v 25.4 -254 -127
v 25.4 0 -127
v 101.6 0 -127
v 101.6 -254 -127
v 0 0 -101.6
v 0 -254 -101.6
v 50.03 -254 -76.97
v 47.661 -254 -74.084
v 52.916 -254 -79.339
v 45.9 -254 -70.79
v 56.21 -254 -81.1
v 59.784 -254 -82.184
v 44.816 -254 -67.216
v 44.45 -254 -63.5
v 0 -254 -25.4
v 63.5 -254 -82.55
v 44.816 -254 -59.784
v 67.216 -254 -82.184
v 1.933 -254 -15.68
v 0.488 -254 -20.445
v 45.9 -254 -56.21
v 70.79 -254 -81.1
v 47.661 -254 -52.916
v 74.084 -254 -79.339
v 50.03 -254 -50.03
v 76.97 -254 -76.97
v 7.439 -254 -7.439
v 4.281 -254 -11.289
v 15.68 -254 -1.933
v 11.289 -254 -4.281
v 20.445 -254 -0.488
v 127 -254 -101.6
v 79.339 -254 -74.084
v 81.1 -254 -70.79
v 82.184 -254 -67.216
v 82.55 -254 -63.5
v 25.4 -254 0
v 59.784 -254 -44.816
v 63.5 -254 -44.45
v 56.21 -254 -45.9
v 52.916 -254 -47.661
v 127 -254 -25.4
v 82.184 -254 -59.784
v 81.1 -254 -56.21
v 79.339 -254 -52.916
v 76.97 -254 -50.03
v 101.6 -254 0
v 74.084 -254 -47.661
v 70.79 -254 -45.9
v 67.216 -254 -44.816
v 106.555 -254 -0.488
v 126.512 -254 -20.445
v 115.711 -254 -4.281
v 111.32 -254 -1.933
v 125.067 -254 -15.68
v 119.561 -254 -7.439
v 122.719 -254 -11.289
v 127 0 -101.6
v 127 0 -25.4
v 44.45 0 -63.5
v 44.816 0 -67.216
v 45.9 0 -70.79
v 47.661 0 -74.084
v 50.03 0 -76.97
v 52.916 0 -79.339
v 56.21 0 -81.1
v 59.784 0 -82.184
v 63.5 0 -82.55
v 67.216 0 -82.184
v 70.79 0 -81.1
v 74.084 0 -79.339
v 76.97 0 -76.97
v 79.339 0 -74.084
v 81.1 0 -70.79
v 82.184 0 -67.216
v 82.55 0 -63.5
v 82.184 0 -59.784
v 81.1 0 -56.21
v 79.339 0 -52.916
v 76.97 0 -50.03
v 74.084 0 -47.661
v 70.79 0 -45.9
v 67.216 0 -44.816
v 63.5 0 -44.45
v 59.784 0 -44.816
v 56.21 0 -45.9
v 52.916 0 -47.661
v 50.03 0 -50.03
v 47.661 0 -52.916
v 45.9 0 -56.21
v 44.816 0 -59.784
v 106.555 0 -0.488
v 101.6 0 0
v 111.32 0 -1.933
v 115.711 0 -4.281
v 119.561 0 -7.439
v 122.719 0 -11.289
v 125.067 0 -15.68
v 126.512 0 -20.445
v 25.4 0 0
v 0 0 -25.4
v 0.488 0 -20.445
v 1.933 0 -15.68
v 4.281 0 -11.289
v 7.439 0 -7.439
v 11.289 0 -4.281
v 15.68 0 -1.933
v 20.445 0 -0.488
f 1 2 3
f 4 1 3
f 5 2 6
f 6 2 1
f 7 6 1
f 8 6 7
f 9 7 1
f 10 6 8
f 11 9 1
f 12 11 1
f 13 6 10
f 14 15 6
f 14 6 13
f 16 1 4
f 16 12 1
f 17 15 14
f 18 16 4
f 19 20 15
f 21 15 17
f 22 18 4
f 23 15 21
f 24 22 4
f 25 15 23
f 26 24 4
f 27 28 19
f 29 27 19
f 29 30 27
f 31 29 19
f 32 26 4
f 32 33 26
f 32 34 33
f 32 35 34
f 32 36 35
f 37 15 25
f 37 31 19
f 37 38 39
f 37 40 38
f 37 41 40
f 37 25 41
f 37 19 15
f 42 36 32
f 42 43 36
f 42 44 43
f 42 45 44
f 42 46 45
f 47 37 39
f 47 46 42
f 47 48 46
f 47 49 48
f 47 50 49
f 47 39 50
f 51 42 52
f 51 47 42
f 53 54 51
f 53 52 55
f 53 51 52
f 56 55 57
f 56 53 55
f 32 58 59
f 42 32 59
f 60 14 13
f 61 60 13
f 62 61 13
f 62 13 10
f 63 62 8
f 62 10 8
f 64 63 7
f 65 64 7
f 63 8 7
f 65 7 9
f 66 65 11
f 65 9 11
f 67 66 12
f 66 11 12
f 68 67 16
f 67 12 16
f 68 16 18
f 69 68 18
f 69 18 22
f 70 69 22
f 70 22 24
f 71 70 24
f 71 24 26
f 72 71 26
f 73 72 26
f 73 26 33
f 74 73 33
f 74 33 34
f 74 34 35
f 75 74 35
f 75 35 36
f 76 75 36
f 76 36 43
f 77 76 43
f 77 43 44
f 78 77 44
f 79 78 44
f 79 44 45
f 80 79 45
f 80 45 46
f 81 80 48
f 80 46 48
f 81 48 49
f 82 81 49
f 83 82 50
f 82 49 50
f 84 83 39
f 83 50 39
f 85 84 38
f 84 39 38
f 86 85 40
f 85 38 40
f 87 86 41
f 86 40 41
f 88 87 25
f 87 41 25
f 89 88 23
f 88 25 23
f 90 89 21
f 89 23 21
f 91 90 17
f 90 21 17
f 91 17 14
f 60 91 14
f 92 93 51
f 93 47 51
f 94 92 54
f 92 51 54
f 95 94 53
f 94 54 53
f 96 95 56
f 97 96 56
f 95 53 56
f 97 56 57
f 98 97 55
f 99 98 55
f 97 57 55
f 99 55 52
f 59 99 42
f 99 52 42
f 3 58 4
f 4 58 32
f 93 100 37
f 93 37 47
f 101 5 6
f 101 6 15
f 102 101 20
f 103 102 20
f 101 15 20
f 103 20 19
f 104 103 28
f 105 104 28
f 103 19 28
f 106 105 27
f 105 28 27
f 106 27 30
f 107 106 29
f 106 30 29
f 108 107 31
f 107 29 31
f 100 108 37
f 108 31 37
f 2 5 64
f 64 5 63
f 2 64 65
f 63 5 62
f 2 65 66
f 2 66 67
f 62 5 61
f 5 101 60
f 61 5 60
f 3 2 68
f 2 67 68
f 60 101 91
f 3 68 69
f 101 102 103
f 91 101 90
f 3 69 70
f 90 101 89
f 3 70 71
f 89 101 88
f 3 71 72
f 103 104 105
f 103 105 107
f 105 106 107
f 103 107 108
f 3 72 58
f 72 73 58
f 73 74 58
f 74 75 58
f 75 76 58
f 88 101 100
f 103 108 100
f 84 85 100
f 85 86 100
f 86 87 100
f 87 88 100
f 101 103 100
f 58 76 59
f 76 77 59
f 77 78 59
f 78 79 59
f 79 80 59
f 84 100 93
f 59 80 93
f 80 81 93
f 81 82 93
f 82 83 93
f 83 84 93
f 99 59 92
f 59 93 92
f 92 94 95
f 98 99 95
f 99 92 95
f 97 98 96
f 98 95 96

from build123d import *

# Parameters (mm, degrees)
F0_W     = 127
F0_H     = 127
F1_DEPTH = 254
F3_D     = 38.1
F4_R     = 25.4
F5_SIZE  = 25.4


with BuildPart() as f1:
    # F0 (on Front) → F1 (new body)
    with BuildSketch(Plane.XZ):
        with Locations((63.5, -63.5)):
            Rectangle(F0_W, F0_H)
    extrude(amount=F1_DEPTH)

    # F3 (through all)
    with Locations(Plane(origin=(0, 0, 0), x_dir=(1, 0, 0), z_dir=(0, 1, 0))):
        with Locations((63.5, 63.5)):
            Hole(F3_D / 2)

    # F4
    f4_edges = [f1.edges().sort_by_distance(p)[0] for p in [
        (127, -127, 0),
        (0, -127, 0),
    ]]
    fillet(f4_edges, radius=F4_R)

    # F5
    f5_edges = [f1.edges().sort_by_distance(p)[0] for p in [
        (127, -127, -127),
        (0, -127, -127),
    ]]
    chamfer(f5_edges, length=F5_SIZE)


solid = f1.part
